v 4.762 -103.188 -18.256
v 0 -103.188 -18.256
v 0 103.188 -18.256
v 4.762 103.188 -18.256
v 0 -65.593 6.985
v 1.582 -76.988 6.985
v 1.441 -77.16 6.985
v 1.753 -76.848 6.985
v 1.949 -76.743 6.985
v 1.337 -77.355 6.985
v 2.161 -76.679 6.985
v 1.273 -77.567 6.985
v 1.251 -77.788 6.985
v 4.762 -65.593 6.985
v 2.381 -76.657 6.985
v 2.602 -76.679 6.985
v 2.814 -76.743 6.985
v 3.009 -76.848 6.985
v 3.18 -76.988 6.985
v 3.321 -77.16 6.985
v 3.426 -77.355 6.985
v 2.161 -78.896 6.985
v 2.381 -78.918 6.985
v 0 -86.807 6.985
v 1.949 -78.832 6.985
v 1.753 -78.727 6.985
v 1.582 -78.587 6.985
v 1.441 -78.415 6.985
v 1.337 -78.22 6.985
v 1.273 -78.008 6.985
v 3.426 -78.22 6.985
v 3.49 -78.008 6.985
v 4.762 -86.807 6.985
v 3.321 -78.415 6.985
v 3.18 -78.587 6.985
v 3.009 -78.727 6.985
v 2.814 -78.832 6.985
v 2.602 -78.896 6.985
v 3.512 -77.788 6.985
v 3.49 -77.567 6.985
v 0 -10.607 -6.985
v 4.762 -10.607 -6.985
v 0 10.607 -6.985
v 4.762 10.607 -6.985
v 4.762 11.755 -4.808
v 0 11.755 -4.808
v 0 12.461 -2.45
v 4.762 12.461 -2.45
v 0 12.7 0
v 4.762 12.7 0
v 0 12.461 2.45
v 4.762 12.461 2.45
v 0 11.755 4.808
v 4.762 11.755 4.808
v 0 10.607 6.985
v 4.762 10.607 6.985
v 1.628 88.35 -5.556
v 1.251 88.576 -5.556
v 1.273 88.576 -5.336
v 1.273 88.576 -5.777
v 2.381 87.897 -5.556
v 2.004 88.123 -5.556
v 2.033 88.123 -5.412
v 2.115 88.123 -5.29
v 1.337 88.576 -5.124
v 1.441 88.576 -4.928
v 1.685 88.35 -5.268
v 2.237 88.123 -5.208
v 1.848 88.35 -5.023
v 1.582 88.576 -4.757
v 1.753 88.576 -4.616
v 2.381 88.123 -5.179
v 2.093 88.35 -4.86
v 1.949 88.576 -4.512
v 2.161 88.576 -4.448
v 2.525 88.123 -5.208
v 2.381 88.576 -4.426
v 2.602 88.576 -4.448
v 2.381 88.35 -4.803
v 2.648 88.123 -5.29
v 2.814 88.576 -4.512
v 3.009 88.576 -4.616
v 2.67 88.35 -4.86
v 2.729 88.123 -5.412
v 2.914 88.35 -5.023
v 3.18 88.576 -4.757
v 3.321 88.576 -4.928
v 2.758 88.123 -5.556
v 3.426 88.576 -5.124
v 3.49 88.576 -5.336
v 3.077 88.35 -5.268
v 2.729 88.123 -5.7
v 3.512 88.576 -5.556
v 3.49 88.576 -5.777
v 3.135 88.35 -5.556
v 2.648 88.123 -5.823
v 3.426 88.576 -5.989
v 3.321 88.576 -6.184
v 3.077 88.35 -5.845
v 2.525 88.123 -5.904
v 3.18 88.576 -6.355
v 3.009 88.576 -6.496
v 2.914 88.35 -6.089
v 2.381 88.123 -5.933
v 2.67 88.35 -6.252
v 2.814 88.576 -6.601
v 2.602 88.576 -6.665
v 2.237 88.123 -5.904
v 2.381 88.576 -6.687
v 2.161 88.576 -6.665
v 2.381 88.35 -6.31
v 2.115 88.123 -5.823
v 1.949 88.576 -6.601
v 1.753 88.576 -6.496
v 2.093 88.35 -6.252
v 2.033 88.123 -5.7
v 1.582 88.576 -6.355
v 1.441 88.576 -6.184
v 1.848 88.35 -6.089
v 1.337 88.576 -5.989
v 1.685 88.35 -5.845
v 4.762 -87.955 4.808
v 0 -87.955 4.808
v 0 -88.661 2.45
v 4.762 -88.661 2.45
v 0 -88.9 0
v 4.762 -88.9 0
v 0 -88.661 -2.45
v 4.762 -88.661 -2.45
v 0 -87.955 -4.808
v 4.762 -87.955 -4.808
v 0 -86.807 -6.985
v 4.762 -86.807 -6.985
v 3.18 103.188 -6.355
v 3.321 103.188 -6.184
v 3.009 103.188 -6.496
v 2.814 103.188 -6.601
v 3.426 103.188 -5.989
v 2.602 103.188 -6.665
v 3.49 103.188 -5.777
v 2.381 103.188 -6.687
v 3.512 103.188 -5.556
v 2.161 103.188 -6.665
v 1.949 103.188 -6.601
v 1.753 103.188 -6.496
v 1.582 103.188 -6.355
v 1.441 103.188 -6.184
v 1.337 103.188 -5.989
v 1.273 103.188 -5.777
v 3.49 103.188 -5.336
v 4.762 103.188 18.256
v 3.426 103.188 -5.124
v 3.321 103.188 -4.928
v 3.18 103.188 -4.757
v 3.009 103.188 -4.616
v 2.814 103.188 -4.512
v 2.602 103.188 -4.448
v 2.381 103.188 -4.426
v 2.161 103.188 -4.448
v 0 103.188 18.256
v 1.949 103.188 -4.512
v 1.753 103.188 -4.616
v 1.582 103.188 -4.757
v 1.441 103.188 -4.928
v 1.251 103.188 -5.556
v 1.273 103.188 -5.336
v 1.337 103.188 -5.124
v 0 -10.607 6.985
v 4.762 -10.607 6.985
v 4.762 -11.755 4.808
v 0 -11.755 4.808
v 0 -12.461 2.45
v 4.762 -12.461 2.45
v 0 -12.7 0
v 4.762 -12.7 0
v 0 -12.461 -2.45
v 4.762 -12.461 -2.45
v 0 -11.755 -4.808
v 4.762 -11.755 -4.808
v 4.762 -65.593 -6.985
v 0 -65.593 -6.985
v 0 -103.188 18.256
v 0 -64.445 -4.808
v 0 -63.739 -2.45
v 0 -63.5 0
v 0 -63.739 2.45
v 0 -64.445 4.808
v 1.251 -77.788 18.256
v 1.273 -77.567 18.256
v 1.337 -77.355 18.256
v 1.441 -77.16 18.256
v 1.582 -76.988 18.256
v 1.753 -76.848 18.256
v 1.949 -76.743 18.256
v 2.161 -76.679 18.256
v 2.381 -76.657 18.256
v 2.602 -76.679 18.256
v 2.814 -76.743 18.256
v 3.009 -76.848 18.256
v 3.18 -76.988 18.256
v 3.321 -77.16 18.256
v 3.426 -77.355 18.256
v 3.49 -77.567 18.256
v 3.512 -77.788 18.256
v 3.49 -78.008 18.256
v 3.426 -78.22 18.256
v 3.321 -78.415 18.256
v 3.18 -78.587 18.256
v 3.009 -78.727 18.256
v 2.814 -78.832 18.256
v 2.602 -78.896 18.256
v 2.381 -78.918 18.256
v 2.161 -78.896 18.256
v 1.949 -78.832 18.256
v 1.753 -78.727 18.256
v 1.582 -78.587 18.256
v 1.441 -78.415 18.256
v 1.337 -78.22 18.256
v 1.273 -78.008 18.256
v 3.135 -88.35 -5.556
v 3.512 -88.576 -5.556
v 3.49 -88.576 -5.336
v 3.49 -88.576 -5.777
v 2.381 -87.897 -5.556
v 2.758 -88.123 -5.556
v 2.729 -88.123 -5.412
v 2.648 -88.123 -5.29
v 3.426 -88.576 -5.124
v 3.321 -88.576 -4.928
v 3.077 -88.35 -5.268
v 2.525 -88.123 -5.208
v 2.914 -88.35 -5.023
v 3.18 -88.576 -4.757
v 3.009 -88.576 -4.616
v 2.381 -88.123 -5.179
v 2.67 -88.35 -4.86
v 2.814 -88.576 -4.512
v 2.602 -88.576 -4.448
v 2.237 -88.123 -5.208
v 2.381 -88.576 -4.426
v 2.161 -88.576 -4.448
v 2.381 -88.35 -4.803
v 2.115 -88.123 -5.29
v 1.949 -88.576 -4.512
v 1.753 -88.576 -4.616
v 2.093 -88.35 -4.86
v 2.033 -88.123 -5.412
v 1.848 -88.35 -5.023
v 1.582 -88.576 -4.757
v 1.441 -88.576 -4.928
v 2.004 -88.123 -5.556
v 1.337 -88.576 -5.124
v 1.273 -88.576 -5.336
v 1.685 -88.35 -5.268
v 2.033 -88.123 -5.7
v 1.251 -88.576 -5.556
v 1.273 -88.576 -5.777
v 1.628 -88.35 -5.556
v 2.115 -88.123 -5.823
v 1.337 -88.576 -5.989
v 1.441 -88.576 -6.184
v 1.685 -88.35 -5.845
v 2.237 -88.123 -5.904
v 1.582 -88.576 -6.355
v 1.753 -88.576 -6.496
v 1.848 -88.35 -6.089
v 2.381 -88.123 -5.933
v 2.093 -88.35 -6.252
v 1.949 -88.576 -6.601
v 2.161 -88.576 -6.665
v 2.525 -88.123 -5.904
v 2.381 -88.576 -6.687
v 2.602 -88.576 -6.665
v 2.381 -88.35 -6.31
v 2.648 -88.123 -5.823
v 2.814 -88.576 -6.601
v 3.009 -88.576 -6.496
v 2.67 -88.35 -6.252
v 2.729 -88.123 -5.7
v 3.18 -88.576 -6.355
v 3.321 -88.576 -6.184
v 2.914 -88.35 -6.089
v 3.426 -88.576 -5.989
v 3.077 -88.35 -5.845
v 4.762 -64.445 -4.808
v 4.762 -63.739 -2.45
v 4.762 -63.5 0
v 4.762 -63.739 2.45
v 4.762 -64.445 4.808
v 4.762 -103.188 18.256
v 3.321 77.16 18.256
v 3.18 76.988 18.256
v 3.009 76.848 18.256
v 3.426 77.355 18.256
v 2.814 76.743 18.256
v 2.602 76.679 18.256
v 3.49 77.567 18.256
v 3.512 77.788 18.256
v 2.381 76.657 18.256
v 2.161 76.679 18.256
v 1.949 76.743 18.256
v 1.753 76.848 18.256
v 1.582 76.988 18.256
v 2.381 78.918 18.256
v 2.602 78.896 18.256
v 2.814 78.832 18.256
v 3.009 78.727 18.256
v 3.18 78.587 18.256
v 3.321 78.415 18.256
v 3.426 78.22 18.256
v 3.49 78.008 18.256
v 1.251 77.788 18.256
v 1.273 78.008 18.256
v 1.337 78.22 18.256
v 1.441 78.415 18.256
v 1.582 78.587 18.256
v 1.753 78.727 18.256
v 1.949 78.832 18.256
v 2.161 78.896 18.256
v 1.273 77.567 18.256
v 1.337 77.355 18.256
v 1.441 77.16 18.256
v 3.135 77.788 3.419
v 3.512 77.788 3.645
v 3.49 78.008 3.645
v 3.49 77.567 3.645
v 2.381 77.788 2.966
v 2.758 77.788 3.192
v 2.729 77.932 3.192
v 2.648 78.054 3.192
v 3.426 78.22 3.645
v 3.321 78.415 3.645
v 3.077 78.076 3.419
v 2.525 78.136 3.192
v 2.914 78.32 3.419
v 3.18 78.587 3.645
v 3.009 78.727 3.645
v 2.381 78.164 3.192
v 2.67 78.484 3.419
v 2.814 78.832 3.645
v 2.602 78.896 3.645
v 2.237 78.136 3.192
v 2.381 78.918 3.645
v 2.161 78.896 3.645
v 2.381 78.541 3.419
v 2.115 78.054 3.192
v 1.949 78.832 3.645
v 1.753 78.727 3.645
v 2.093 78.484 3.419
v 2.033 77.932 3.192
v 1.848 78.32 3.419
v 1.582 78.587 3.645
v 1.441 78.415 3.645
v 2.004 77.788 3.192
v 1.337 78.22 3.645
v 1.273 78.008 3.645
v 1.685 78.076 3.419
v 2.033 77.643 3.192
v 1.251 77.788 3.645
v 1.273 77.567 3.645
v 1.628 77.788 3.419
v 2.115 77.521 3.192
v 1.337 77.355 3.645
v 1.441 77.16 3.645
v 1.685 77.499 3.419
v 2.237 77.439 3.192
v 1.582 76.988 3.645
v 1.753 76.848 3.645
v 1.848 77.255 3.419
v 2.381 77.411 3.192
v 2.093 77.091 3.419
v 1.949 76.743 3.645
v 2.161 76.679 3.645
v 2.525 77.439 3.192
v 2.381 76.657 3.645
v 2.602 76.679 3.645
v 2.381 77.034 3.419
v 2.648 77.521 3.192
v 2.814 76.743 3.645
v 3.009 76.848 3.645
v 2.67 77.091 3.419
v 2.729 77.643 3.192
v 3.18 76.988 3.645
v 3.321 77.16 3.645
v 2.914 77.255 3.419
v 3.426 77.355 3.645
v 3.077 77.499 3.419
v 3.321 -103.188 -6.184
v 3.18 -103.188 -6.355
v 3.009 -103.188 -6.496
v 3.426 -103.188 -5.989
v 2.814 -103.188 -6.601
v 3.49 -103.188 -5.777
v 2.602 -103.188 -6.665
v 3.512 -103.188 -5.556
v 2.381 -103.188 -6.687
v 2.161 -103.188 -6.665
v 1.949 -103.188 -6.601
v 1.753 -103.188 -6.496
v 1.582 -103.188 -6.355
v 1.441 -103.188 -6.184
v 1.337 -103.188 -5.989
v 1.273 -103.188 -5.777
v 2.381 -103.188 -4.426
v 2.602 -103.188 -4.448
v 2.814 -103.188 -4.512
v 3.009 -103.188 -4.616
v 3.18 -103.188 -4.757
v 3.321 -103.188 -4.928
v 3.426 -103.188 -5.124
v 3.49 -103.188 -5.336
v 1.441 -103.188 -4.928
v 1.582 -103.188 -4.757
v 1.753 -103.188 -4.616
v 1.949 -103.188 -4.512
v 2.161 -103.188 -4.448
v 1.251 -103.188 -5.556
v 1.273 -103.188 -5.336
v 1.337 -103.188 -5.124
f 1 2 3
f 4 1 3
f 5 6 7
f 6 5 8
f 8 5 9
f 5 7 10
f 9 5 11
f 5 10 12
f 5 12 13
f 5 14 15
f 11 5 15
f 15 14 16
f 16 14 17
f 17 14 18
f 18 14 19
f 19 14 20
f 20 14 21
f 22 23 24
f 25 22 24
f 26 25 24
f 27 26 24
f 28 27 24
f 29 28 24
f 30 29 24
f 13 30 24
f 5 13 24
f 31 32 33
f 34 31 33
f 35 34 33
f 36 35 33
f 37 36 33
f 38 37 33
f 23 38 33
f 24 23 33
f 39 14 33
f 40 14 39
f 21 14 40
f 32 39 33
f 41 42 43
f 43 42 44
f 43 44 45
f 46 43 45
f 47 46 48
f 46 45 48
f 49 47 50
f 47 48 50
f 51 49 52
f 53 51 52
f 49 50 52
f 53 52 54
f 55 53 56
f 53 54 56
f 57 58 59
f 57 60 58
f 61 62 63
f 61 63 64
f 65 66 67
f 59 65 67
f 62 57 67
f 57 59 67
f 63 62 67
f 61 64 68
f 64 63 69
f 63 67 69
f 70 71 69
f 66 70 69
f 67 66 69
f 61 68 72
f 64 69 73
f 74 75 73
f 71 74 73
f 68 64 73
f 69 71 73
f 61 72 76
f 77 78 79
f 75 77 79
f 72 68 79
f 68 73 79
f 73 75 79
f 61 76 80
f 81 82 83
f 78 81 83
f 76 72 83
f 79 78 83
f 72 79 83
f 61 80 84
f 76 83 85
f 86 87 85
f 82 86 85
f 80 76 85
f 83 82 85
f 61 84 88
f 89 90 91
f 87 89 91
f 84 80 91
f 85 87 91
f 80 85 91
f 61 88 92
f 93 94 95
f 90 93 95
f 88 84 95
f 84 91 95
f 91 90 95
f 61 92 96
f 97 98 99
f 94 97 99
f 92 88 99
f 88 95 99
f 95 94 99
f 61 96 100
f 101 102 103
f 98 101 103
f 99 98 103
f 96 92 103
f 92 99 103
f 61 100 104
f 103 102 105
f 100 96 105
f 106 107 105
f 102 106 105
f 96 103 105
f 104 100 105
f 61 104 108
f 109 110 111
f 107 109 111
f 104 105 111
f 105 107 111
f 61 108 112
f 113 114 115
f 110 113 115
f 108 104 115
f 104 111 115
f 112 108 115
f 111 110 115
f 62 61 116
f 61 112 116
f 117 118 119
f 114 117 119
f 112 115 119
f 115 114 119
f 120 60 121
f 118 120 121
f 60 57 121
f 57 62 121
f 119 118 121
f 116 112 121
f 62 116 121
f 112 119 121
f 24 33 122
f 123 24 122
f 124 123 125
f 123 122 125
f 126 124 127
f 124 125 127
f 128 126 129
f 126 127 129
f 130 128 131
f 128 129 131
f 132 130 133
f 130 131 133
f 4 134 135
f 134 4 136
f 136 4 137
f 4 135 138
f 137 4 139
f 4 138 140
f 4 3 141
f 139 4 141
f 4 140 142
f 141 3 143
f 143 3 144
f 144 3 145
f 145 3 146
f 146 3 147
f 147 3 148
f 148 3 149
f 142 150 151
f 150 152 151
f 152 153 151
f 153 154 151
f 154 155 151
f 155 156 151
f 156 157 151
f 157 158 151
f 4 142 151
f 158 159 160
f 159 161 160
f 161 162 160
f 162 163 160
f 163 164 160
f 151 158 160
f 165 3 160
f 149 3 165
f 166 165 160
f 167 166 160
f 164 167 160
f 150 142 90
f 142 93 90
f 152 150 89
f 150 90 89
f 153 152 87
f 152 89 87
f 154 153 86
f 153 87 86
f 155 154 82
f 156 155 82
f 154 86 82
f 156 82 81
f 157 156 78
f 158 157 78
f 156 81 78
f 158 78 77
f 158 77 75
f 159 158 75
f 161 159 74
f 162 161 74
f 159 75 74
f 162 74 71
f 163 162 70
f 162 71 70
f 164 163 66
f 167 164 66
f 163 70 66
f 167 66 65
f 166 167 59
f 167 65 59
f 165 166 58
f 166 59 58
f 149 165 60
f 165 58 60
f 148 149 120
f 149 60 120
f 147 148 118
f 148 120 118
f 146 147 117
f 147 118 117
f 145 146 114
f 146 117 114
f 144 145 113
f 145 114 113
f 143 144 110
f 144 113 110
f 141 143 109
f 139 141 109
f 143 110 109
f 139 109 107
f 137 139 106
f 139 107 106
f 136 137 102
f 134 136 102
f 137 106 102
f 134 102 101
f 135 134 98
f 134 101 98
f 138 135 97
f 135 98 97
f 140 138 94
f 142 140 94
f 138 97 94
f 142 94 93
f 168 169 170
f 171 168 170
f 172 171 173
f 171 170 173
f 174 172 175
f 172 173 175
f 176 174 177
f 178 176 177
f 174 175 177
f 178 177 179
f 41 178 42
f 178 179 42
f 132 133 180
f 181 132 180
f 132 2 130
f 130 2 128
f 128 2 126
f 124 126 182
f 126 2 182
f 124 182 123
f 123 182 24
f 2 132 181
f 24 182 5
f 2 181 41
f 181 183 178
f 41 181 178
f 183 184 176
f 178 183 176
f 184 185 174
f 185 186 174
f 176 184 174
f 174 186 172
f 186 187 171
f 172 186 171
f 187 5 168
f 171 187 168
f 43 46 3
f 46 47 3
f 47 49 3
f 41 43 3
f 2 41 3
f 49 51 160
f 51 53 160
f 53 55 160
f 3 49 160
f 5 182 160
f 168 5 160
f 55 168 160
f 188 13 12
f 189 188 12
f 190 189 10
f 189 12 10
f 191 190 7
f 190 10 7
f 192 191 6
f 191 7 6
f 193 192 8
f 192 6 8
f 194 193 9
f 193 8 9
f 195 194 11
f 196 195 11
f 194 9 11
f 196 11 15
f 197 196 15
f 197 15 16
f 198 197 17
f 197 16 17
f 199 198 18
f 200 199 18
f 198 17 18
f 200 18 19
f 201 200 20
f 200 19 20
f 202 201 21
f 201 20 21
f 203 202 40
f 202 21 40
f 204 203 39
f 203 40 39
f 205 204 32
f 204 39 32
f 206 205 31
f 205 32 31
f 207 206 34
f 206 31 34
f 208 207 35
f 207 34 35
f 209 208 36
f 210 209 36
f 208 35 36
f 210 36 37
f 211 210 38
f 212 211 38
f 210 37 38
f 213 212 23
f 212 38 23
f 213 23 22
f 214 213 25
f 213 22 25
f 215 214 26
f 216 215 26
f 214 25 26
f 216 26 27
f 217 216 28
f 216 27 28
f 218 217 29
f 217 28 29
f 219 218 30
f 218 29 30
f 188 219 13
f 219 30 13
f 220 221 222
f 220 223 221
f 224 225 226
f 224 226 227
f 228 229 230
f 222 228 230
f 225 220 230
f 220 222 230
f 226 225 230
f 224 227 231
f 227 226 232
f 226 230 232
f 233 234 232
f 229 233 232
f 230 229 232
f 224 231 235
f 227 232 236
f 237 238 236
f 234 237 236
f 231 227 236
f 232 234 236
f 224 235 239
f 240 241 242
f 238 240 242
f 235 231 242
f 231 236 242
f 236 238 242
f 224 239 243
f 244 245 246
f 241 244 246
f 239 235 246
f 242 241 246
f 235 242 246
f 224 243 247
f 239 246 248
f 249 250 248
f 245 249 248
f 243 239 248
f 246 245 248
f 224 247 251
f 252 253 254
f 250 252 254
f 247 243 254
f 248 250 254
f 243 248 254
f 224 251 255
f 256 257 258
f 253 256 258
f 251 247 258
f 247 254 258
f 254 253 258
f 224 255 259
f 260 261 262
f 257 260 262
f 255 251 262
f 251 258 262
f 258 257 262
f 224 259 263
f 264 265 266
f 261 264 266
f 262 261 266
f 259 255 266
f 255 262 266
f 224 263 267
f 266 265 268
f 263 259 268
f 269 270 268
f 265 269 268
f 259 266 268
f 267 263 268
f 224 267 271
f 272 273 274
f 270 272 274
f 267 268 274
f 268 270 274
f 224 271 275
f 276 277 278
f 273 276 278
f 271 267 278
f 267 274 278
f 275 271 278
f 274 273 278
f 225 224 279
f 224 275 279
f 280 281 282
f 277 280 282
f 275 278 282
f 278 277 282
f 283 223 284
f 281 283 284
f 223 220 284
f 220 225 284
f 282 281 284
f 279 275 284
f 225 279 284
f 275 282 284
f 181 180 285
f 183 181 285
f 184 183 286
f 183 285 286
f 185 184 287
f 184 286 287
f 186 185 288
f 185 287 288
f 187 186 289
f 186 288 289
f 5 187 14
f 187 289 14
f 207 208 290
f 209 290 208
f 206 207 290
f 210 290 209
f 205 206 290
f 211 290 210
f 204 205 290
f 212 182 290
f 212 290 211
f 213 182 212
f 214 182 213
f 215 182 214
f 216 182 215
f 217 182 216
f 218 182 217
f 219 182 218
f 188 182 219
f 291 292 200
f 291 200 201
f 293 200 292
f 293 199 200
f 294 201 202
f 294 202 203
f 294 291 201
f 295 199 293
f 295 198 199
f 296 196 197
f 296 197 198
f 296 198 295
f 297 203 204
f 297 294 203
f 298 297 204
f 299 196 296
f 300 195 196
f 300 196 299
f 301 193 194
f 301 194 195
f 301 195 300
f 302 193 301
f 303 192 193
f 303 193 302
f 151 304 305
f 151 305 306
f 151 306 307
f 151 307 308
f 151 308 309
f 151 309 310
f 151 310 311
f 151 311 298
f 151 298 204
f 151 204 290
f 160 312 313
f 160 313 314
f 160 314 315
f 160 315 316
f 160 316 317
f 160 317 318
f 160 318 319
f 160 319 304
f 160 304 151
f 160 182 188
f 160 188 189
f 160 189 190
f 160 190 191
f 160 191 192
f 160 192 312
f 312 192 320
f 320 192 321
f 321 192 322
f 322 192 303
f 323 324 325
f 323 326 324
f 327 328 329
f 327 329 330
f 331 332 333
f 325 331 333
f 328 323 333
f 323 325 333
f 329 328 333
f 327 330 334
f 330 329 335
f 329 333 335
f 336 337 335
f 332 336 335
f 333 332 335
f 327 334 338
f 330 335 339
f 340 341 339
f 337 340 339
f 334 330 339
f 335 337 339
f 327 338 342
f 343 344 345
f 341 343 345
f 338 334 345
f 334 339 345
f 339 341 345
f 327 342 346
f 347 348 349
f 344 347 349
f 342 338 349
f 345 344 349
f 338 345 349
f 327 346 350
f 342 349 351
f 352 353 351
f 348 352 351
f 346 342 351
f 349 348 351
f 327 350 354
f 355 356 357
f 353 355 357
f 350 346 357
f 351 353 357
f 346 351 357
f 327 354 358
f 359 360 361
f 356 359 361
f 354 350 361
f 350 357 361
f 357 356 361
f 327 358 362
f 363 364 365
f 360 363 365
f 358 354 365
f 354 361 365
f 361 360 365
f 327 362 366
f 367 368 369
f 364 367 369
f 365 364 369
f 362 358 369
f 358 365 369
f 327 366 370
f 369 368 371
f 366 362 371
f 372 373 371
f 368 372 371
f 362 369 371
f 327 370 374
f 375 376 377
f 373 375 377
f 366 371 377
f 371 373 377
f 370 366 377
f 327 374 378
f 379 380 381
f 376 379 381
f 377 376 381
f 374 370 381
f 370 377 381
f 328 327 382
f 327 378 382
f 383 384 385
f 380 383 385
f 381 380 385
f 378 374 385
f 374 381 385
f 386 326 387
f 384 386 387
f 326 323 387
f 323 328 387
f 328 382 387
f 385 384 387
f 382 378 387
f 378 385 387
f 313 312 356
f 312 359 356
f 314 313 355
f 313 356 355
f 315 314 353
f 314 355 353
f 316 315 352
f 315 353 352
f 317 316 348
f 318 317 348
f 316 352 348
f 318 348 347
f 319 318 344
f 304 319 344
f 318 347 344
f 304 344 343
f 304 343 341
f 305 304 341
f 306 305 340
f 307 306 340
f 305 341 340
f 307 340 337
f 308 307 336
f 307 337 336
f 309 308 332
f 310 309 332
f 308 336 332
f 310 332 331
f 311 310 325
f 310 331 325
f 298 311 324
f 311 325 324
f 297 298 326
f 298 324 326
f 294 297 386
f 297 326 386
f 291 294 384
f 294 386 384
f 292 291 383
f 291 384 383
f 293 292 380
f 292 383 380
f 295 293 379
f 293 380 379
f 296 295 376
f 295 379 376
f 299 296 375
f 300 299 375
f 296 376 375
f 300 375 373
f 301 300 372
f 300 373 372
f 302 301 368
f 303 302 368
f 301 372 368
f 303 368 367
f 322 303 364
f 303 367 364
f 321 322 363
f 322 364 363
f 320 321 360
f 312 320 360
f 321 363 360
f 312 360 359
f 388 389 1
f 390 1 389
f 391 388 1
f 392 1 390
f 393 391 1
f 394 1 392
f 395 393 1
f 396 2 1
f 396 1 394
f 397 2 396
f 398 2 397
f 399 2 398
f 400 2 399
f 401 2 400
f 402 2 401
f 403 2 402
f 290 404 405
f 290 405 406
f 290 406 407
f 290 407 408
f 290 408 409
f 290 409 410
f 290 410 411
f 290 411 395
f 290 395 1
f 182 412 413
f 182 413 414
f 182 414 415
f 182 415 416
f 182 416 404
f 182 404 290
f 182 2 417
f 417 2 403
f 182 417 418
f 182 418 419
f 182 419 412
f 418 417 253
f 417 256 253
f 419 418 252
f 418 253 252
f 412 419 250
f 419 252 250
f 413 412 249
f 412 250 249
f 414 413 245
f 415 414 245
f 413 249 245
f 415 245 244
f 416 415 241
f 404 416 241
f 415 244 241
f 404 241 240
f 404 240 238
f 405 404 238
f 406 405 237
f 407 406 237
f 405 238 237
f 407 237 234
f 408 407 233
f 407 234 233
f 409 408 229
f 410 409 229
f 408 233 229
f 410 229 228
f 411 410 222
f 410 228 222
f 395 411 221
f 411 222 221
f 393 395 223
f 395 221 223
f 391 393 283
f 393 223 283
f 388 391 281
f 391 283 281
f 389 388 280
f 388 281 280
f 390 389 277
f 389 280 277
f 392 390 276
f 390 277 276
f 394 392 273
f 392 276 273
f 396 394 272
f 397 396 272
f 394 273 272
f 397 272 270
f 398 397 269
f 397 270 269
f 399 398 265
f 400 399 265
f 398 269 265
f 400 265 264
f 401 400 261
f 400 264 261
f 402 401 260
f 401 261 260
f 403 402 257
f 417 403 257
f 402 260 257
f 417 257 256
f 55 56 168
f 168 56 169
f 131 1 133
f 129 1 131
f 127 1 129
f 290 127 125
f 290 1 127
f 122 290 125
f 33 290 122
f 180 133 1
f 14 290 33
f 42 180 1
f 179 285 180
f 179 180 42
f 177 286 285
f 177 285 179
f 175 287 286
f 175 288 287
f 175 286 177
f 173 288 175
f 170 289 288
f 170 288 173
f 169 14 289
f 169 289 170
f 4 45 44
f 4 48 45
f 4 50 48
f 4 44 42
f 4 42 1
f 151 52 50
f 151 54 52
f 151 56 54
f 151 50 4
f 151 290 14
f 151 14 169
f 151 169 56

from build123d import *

# Parameters (mm, degrees)
F0_W           = 206.375
F0_H           = 36.5125
F1_DEPTH       = 4.7625
F5_D           = 2.2606
F5_DEPTH       = 14.61135
F5_TIP         = 0.6791527577
F5_ON_F3_D     = 2.2606
F5_ON_F3_DEPTH = 14.61135
F5_ON_F3_TIP   = 0.6791527577
F5_ON_F2_D     = 2.2606
F5_ON_F2_DEPTH = 14.61135
F5_ON_F2_TIP   = 0.6791527577
F7_DEPTH       = 25.4


with BuildPart() as f1:
    # F0 (on Right) → F1 (new body)
    with BuildSketch(Plane.YZ):
        Rectangle(F0_W, F0_H)
    extrude(amount=F1_DEPTH)

    # F5
    with Locations(Plane.XY.offset(18.25625)):
        with Locations((2.38125, -77.7875), (2.38125, 77.7875)):
            Hole(F5_D / 2, depth=F5_DEPTH)
            with Locations((0, 0, -(F5_DEPTH + F5_TIP / 2))):  # 118° drill point
                Cone(0, F5_D / 2, F5_TIP, mode=Mode.SUBTRACT)

    # F5 on F3
    with Locations(Plane.XZ.offset(103.1875)):
        with Locations((2.38125, -5.55625)):
            Hole(F5_ON_F3_D / 2, depth=F5_ON_F3_DEPTH)
            with Locations((0, 0, -(F5_ON_F3_DEPTH + F5_ON_F3_TIP / 2))):  # 118° drill point
                Cone(0, F5_ON_F3_D / 2, F5_ON_F3_TIP, mode=Mode.SUBTRACT)

    # F5 on F2
    with Locations(Plane(origin=(0, 103.1875, 0), x_dir=(-1, 0, 0), z_dir=(0, 1, 0))):
        with Locations((-2.38125, -5.55625)):
            Hole(F5_ON_F2_D / 2, depth=F5_ON_F2_DEPTH)
            with Locations((0, 0, -(F5_ON_F2_DEPTH + F5_ON_F2_TIP / 2))):  # 118° drill point
                Cone(0, F5_ON_F2_D / 2, F5_ON_F2_TIP, mode=Mode.SUBTRACT)

    # F6 (on face) → F7 (cut)
    with BuildSketch(Plane.YZ.offset(4.7625)):
        with BuildLine():
            Line((-65.5934088888, 6.985), (-86.8065911112, 6.985))
            ThreePointArc((-86.8065911112, 6.985), (-88.9, 0), (-86.8065911112, -6.985))
            Line((-86.8065911112, -6.985), (-65.5934088888, -6.985))
            ThreePointArc((-65.5934088888, -6.985), (-63.5, 0), (-65.5934088888, 6.985))
        make_face()
        with BuildLine():
            ThreePointArc((10.6065911112, -6.985), (12.7, 0), (10.6065911112, 6.985))
            Line((10.6065911112, 6.985), (-10.6065911112, 6.985))
            ThreePointArc((-10.6065911112, 6.985), (-12.7, 0), (-10.6065911112, -6.985))
            Line((-10.6065911112, -6.985), (10.6065911112, -6.985))
        make_face()
    extrude(amount=-F7_DEPTH, mode=Mode.SUBTRACT)


solid = f1.part
